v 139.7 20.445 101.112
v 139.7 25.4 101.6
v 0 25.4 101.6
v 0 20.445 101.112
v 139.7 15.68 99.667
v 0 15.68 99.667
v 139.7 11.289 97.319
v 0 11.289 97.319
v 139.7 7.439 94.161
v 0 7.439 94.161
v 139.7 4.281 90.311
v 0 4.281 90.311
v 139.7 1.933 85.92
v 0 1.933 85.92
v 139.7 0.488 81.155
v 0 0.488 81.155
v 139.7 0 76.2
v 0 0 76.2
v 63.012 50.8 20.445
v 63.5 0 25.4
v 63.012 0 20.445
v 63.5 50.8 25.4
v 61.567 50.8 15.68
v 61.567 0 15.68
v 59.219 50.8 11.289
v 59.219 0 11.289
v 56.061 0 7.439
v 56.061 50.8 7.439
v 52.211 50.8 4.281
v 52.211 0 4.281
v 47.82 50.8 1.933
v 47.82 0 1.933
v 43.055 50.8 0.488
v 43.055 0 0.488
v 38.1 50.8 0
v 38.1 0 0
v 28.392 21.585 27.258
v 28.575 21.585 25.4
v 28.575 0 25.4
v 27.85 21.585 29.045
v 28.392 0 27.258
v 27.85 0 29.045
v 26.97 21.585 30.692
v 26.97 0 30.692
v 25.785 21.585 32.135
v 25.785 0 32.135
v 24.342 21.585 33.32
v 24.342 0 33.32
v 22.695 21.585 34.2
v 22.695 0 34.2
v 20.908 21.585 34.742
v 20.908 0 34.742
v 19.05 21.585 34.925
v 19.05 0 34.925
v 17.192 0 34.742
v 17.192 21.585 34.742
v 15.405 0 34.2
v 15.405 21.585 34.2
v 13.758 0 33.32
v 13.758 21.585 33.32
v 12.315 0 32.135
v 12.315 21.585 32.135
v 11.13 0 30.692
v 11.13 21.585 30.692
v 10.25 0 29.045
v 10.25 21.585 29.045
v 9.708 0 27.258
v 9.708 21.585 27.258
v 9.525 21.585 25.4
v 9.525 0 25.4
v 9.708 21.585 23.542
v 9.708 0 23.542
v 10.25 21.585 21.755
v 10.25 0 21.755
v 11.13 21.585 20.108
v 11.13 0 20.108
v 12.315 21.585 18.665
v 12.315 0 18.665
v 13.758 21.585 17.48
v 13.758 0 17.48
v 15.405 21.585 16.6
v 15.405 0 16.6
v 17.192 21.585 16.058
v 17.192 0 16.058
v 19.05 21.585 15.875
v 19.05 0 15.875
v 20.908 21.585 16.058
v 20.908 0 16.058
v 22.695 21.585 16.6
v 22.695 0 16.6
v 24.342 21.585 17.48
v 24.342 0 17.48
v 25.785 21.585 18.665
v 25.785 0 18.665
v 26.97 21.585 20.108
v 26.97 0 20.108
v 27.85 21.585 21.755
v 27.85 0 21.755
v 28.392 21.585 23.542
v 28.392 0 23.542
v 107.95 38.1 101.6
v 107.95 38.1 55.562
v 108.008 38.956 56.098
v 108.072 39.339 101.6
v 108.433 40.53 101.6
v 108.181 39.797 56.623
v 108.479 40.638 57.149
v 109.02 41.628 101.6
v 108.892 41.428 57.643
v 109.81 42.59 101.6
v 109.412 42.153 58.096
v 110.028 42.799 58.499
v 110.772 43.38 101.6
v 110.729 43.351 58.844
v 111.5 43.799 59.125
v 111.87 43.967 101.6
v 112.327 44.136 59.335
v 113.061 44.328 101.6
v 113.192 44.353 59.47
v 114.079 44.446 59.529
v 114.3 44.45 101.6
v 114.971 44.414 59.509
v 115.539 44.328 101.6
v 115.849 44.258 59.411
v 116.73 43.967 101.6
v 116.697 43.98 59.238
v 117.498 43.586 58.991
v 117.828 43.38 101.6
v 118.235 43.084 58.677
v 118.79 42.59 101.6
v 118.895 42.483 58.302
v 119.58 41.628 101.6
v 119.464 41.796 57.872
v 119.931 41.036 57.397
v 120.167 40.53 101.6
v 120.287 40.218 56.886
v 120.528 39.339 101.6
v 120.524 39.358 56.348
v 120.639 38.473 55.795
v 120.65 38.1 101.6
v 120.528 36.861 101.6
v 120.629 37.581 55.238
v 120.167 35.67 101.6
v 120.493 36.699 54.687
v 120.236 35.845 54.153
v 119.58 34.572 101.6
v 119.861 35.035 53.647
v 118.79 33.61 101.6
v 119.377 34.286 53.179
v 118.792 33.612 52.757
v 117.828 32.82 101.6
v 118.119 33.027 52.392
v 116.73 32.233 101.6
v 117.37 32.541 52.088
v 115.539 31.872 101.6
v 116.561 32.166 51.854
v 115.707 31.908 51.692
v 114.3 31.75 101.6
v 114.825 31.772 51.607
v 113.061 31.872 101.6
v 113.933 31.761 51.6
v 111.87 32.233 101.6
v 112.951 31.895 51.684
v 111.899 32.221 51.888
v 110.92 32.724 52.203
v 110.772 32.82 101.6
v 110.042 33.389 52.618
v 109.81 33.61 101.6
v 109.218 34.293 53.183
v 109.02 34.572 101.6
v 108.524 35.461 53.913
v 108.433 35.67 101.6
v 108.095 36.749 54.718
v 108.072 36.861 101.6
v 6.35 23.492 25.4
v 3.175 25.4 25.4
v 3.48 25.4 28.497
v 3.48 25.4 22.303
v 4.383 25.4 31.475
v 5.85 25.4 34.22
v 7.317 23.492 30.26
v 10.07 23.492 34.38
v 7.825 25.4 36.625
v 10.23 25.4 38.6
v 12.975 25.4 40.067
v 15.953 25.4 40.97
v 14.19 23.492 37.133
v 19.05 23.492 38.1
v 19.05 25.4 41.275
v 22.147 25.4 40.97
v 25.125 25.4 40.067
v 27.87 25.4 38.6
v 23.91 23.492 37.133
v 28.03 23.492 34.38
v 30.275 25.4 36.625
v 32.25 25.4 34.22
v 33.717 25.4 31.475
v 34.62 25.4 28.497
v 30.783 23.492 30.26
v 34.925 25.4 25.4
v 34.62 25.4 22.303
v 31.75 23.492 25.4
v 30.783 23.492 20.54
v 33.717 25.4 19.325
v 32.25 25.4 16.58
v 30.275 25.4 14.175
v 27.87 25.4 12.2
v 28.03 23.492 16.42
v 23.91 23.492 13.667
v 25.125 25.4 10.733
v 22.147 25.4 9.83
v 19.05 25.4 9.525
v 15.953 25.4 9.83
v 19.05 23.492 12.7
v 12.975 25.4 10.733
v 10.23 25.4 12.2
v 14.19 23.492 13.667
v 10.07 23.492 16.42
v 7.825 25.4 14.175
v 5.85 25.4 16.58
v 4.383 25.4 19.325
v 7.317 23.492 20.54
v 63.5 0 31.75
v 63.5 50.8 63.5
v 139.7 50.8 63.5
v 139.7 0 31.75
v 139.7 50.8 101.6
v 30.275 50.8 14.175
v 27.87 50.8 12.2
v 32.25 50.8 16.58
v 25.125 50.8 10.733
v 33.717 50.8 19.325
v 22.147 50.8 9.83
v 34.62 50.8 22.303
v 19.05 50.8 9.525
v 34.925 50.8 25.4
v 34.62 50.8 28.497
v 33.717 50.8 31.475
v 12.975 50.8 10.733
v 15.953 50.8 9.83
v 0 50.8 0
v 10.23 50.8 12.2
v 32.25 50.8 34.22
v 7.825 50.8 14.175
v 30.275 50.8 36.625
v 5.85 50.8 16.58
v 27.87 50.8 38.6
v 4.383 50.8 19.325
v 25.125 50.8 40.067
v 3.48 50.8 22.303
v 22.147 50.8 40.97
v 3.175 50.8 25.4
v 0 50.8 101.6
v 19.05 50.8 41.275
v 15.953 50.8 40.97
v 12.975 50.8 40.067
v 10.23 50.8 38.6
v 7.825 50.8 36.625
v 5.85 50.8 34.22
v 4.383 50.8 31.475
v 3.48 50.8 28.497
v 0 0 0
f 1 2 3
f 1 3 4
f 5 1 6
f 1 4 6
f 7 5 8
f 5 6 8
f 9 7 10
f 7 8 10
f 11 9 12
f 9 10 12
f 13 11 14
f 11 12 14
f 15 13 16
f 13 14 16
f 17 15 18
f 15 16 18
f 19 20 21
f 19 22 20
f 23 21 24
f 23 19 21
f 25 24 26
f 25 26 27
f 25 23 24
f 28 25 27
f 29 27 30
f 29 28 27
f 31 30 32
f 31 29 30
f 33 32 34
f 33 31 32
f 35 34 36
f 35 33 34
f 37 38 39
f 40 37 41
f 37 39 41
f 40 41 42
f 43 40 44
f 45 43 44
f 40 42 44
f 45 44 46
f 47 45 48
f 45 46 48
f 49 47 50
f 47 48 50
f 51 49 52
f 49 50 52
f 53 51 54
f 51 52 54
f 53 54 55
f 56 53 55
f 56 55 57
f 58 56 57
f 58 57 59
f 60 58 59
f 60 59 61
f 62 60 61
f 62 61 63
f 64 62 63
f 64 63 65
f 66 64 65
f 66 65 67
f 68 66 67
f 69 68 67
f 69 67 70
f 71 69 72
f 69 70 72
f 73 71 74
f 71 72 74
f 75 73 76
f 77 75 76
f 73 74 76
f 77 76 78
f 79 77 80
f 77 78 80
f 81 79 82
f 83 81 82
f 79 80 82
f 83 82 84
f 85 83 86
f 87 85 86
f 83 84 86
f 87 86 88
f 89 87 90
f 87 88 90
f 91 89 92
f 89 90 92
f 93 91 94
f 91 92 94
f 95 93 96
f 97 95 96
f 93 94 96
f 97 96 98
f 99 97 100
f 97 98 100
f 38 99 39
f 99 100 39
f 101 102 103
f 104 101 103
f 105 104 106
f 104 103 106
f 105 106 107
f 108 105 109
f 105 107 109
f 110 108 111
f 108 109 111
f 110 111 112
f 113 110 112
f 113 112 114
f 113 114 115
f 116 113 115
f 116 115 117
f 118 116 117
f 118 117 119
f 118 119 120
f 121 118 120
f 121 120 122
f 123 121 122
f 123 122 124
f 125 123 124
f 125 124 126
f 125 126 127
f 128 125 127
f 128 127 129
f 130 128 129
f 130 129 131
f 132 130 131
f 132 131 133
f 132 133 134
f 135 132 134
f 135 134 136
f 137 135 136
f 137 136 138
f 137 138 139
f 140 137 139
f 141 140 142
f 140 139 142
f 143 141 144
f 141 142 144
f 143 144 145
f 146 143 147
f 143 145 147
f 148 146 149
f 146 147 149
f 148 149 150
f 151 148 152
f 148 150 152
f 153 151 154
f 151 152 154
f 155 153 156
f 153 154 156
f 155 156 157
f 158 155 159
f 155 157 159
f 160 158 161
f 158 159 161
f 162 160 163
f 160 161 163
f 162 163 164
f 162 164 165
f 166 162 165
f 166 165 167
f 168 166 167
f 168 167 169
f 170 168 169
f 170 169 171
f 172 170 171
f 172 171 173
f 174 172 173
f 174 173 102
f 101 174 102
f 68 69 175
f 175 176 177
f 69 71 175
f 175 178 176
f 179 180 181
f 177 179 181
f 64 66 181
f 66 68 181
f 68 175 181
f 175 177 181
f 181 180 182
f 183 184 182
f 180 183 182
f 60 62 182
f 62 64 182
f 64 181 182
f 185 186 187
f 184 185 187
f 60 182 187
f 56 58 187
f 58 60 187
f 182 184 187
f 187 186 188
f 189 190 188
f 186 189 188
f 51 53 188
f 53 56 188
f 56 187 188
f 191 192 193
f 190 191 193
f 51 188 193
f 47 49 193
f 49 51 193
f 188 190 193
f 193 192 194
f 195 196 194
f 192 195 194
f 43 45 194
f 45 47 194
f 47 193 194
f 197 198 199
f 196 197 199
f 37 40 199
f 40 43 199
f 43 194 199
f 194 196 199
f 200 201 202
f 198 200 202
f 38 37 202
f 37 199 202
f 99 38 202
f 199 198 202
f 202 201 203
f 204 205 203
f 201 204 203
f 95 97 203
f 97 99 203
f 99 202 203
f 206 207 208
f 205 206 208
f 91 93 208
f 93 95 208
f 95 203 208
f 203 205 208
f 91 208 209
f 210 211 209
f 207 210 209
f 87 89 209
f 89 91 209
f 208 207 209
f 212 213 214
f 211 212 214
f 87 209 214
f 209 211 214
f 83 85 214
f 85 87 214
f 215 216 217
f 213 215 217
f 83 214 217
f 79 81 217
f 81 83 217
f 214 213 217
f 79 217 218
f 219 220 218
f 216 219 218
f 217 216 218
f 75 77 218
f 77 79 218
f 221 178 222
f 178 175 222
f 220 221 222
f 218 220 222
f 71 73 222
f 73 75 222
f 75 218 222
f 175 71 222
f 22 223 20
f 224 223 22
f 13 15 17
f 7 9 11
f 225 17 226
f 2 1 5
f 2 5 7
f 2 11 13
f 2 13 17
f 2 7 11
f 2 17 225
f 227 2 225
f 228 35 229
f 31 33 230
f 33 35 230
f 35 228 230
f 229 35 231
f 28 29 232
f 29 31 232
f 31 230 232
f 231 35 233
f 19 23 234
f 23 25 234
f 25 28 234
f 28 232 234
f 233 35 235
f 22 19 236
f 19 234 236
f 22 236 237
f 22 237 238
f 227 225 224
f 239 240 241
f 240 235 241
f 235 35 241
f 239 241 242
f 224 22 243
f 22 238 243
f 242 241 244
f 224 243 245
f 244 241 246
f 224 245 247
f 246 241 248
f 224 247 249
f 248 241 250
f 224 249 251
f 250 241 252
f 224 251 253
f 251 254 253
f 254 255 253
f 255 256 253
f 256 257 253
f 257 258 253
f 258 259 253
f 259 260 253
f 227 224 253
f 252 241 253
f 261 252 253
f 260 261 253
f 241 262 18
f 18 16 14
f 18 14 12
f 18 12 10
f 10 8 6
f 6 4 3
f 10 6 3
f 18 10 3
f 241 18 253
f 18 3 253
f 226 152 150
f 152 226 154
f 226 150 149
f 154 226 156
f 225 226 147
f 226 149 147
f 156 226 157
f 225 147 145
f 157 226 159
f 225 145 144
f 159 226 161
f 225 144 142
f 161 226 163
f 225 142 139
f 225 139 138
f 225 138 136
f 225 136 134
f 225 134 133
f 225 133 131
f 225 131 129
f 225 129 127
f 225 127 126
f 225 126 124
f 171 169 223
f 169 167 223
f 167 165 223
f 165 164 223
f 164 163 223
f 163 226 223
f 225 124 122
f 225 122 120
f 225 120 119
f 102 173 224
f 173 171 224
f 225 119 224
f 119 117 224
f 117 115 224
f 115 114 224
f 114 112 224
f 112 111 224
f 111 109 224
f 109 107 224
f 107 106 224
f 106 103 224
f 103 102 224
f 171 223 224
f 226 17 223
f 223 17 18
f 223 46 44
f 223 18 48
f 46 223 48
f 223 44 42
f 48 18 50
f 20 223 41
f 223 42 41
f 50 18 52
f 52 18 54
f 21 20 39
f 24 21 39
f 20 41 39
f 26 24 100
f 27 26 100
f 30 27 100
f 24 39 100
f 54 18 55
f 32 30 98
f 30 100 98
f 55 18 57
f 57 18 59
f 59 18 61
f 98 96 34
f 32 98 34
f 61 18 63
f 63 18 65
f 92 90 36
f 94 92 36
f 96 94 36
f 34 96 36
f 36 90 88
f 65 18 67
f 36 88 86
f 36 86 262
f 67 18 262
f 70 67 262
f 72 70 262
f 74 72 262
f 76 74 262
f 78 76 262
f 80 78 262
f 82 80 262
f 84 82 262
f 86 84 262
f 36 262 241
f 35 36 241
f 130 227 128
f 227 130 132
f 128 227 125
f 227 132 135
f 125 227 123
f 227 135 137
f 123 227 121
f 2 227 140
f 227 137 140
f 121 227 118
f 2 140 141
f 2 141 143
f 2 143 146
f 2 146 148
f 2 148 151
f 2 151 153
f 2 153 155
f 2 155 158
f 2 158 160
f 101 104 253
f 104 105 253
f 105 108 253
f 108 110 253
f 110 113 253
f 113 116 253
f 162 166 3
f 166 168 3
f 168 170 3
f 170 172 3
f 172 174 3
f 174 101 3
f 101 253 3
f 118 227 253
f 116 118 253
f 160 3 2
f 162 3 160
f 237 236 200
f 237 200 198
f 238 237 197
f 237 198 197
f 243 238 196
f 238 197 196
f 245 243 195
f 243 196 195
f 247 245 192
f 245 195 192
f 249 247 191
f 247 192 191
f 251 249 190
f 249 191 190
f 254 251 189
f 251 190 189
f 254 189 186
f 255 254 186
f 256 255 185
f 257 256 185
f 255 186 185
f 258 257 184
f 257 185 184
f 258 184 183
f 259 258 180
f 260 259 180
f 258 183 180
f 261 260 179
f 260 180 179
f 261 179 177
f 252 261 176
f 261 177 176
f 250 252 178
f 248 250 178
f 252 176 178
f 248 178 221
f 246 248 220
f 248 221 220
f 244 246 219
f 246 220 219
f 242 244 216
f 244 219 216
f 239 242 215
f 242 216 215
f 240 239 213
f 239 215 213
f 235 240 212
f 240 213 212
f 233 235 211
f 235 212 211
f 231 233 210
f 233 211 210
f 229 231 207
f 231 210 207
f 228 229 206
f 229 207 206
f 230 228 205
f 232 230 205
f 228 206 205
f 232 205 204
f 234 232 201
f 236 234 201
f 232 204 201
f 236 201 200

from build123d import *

# Parameters (mm, degrees)
F1_DEPTH = 139.7
F0_W     = 50.8
F0_H     = 24.8791221529
F2_DEPTH = 63.5
F3_R     = 25.4
F5_D     = 19.05
F6_D     = 31.75
F6_DEPTH = 25.4
F6_TIP   = 9.5386623271
F8_D     = 12.7


with BuildPart() as f1:
    # F0 (on Right) → F1 (new body)
    with BuildSketch(Plane.YZ):
        with BuildLine():
            Line((0, 63.5), (0, 31.75))
            Line((0, 31.75), (50.8, 63.5))
            Line((50.8, 63.5), (50.8, 101.6))
            Line((50.8, 101.6), (25.4, 101.6))
            ThreePointArc((25.4, 101.6), (7.4394877579, 94.1605122421), (0, 76.2))
            Line((0, 76.2), (0, 63.5))
        make_face()
    extrude(amount=F1_DEPTH)

    # F0 (on Right) → F2 (join)
    with BuildSketch(Plane.YZ):
        Polygon((0, 31.75), (0, 24.8791221529), (50.8, 24.8791221529), (50.8, 63.5), align=None)
        with Locations((25.4, 12.4395610765)):
            Rectangle(F0_W, F0_H)
    extrude(amount=F2_DEPTH)

    # F3
    f3_edges = [f1.edges().sort_by_distance(p)[0] for p in [
        (63.5, 25.4, 0),
    ]]
    fillet(f3_edges, radius=F3_R)

    # F5 (through all)
    with Locations(Plane(origin=(0, 50.8, 0), x_dir=(-1, 0, 0), z_dir=(0, 1, 0))):
        with Locations((-19.05, 25.4)):
            Hole(F5_D / 2)

    # F6
    with Locations(Plane(origin=(0, 50.8, 0), x_dir=(-1, 0, 0), z_dir=(0, 1, 0))):
        with Locations((-19.05, 25.4)):
            Hole(F6_D / 2, depth=F6_DEPTH)
            with Locations((0, 0, -(F6_DEPTH + F6_TIP / 2))):  # 118° drill point
                Cone(0, F6_D / 2, F6_TIP, mode=Mode.SUBTRACT)

    # F8 (through all)
    with Locations(Plane.XY.offset(101.6)):
        with Locations((114.3, 38.1)):
            Hole(F8_D / 2)


solid = f1.part
